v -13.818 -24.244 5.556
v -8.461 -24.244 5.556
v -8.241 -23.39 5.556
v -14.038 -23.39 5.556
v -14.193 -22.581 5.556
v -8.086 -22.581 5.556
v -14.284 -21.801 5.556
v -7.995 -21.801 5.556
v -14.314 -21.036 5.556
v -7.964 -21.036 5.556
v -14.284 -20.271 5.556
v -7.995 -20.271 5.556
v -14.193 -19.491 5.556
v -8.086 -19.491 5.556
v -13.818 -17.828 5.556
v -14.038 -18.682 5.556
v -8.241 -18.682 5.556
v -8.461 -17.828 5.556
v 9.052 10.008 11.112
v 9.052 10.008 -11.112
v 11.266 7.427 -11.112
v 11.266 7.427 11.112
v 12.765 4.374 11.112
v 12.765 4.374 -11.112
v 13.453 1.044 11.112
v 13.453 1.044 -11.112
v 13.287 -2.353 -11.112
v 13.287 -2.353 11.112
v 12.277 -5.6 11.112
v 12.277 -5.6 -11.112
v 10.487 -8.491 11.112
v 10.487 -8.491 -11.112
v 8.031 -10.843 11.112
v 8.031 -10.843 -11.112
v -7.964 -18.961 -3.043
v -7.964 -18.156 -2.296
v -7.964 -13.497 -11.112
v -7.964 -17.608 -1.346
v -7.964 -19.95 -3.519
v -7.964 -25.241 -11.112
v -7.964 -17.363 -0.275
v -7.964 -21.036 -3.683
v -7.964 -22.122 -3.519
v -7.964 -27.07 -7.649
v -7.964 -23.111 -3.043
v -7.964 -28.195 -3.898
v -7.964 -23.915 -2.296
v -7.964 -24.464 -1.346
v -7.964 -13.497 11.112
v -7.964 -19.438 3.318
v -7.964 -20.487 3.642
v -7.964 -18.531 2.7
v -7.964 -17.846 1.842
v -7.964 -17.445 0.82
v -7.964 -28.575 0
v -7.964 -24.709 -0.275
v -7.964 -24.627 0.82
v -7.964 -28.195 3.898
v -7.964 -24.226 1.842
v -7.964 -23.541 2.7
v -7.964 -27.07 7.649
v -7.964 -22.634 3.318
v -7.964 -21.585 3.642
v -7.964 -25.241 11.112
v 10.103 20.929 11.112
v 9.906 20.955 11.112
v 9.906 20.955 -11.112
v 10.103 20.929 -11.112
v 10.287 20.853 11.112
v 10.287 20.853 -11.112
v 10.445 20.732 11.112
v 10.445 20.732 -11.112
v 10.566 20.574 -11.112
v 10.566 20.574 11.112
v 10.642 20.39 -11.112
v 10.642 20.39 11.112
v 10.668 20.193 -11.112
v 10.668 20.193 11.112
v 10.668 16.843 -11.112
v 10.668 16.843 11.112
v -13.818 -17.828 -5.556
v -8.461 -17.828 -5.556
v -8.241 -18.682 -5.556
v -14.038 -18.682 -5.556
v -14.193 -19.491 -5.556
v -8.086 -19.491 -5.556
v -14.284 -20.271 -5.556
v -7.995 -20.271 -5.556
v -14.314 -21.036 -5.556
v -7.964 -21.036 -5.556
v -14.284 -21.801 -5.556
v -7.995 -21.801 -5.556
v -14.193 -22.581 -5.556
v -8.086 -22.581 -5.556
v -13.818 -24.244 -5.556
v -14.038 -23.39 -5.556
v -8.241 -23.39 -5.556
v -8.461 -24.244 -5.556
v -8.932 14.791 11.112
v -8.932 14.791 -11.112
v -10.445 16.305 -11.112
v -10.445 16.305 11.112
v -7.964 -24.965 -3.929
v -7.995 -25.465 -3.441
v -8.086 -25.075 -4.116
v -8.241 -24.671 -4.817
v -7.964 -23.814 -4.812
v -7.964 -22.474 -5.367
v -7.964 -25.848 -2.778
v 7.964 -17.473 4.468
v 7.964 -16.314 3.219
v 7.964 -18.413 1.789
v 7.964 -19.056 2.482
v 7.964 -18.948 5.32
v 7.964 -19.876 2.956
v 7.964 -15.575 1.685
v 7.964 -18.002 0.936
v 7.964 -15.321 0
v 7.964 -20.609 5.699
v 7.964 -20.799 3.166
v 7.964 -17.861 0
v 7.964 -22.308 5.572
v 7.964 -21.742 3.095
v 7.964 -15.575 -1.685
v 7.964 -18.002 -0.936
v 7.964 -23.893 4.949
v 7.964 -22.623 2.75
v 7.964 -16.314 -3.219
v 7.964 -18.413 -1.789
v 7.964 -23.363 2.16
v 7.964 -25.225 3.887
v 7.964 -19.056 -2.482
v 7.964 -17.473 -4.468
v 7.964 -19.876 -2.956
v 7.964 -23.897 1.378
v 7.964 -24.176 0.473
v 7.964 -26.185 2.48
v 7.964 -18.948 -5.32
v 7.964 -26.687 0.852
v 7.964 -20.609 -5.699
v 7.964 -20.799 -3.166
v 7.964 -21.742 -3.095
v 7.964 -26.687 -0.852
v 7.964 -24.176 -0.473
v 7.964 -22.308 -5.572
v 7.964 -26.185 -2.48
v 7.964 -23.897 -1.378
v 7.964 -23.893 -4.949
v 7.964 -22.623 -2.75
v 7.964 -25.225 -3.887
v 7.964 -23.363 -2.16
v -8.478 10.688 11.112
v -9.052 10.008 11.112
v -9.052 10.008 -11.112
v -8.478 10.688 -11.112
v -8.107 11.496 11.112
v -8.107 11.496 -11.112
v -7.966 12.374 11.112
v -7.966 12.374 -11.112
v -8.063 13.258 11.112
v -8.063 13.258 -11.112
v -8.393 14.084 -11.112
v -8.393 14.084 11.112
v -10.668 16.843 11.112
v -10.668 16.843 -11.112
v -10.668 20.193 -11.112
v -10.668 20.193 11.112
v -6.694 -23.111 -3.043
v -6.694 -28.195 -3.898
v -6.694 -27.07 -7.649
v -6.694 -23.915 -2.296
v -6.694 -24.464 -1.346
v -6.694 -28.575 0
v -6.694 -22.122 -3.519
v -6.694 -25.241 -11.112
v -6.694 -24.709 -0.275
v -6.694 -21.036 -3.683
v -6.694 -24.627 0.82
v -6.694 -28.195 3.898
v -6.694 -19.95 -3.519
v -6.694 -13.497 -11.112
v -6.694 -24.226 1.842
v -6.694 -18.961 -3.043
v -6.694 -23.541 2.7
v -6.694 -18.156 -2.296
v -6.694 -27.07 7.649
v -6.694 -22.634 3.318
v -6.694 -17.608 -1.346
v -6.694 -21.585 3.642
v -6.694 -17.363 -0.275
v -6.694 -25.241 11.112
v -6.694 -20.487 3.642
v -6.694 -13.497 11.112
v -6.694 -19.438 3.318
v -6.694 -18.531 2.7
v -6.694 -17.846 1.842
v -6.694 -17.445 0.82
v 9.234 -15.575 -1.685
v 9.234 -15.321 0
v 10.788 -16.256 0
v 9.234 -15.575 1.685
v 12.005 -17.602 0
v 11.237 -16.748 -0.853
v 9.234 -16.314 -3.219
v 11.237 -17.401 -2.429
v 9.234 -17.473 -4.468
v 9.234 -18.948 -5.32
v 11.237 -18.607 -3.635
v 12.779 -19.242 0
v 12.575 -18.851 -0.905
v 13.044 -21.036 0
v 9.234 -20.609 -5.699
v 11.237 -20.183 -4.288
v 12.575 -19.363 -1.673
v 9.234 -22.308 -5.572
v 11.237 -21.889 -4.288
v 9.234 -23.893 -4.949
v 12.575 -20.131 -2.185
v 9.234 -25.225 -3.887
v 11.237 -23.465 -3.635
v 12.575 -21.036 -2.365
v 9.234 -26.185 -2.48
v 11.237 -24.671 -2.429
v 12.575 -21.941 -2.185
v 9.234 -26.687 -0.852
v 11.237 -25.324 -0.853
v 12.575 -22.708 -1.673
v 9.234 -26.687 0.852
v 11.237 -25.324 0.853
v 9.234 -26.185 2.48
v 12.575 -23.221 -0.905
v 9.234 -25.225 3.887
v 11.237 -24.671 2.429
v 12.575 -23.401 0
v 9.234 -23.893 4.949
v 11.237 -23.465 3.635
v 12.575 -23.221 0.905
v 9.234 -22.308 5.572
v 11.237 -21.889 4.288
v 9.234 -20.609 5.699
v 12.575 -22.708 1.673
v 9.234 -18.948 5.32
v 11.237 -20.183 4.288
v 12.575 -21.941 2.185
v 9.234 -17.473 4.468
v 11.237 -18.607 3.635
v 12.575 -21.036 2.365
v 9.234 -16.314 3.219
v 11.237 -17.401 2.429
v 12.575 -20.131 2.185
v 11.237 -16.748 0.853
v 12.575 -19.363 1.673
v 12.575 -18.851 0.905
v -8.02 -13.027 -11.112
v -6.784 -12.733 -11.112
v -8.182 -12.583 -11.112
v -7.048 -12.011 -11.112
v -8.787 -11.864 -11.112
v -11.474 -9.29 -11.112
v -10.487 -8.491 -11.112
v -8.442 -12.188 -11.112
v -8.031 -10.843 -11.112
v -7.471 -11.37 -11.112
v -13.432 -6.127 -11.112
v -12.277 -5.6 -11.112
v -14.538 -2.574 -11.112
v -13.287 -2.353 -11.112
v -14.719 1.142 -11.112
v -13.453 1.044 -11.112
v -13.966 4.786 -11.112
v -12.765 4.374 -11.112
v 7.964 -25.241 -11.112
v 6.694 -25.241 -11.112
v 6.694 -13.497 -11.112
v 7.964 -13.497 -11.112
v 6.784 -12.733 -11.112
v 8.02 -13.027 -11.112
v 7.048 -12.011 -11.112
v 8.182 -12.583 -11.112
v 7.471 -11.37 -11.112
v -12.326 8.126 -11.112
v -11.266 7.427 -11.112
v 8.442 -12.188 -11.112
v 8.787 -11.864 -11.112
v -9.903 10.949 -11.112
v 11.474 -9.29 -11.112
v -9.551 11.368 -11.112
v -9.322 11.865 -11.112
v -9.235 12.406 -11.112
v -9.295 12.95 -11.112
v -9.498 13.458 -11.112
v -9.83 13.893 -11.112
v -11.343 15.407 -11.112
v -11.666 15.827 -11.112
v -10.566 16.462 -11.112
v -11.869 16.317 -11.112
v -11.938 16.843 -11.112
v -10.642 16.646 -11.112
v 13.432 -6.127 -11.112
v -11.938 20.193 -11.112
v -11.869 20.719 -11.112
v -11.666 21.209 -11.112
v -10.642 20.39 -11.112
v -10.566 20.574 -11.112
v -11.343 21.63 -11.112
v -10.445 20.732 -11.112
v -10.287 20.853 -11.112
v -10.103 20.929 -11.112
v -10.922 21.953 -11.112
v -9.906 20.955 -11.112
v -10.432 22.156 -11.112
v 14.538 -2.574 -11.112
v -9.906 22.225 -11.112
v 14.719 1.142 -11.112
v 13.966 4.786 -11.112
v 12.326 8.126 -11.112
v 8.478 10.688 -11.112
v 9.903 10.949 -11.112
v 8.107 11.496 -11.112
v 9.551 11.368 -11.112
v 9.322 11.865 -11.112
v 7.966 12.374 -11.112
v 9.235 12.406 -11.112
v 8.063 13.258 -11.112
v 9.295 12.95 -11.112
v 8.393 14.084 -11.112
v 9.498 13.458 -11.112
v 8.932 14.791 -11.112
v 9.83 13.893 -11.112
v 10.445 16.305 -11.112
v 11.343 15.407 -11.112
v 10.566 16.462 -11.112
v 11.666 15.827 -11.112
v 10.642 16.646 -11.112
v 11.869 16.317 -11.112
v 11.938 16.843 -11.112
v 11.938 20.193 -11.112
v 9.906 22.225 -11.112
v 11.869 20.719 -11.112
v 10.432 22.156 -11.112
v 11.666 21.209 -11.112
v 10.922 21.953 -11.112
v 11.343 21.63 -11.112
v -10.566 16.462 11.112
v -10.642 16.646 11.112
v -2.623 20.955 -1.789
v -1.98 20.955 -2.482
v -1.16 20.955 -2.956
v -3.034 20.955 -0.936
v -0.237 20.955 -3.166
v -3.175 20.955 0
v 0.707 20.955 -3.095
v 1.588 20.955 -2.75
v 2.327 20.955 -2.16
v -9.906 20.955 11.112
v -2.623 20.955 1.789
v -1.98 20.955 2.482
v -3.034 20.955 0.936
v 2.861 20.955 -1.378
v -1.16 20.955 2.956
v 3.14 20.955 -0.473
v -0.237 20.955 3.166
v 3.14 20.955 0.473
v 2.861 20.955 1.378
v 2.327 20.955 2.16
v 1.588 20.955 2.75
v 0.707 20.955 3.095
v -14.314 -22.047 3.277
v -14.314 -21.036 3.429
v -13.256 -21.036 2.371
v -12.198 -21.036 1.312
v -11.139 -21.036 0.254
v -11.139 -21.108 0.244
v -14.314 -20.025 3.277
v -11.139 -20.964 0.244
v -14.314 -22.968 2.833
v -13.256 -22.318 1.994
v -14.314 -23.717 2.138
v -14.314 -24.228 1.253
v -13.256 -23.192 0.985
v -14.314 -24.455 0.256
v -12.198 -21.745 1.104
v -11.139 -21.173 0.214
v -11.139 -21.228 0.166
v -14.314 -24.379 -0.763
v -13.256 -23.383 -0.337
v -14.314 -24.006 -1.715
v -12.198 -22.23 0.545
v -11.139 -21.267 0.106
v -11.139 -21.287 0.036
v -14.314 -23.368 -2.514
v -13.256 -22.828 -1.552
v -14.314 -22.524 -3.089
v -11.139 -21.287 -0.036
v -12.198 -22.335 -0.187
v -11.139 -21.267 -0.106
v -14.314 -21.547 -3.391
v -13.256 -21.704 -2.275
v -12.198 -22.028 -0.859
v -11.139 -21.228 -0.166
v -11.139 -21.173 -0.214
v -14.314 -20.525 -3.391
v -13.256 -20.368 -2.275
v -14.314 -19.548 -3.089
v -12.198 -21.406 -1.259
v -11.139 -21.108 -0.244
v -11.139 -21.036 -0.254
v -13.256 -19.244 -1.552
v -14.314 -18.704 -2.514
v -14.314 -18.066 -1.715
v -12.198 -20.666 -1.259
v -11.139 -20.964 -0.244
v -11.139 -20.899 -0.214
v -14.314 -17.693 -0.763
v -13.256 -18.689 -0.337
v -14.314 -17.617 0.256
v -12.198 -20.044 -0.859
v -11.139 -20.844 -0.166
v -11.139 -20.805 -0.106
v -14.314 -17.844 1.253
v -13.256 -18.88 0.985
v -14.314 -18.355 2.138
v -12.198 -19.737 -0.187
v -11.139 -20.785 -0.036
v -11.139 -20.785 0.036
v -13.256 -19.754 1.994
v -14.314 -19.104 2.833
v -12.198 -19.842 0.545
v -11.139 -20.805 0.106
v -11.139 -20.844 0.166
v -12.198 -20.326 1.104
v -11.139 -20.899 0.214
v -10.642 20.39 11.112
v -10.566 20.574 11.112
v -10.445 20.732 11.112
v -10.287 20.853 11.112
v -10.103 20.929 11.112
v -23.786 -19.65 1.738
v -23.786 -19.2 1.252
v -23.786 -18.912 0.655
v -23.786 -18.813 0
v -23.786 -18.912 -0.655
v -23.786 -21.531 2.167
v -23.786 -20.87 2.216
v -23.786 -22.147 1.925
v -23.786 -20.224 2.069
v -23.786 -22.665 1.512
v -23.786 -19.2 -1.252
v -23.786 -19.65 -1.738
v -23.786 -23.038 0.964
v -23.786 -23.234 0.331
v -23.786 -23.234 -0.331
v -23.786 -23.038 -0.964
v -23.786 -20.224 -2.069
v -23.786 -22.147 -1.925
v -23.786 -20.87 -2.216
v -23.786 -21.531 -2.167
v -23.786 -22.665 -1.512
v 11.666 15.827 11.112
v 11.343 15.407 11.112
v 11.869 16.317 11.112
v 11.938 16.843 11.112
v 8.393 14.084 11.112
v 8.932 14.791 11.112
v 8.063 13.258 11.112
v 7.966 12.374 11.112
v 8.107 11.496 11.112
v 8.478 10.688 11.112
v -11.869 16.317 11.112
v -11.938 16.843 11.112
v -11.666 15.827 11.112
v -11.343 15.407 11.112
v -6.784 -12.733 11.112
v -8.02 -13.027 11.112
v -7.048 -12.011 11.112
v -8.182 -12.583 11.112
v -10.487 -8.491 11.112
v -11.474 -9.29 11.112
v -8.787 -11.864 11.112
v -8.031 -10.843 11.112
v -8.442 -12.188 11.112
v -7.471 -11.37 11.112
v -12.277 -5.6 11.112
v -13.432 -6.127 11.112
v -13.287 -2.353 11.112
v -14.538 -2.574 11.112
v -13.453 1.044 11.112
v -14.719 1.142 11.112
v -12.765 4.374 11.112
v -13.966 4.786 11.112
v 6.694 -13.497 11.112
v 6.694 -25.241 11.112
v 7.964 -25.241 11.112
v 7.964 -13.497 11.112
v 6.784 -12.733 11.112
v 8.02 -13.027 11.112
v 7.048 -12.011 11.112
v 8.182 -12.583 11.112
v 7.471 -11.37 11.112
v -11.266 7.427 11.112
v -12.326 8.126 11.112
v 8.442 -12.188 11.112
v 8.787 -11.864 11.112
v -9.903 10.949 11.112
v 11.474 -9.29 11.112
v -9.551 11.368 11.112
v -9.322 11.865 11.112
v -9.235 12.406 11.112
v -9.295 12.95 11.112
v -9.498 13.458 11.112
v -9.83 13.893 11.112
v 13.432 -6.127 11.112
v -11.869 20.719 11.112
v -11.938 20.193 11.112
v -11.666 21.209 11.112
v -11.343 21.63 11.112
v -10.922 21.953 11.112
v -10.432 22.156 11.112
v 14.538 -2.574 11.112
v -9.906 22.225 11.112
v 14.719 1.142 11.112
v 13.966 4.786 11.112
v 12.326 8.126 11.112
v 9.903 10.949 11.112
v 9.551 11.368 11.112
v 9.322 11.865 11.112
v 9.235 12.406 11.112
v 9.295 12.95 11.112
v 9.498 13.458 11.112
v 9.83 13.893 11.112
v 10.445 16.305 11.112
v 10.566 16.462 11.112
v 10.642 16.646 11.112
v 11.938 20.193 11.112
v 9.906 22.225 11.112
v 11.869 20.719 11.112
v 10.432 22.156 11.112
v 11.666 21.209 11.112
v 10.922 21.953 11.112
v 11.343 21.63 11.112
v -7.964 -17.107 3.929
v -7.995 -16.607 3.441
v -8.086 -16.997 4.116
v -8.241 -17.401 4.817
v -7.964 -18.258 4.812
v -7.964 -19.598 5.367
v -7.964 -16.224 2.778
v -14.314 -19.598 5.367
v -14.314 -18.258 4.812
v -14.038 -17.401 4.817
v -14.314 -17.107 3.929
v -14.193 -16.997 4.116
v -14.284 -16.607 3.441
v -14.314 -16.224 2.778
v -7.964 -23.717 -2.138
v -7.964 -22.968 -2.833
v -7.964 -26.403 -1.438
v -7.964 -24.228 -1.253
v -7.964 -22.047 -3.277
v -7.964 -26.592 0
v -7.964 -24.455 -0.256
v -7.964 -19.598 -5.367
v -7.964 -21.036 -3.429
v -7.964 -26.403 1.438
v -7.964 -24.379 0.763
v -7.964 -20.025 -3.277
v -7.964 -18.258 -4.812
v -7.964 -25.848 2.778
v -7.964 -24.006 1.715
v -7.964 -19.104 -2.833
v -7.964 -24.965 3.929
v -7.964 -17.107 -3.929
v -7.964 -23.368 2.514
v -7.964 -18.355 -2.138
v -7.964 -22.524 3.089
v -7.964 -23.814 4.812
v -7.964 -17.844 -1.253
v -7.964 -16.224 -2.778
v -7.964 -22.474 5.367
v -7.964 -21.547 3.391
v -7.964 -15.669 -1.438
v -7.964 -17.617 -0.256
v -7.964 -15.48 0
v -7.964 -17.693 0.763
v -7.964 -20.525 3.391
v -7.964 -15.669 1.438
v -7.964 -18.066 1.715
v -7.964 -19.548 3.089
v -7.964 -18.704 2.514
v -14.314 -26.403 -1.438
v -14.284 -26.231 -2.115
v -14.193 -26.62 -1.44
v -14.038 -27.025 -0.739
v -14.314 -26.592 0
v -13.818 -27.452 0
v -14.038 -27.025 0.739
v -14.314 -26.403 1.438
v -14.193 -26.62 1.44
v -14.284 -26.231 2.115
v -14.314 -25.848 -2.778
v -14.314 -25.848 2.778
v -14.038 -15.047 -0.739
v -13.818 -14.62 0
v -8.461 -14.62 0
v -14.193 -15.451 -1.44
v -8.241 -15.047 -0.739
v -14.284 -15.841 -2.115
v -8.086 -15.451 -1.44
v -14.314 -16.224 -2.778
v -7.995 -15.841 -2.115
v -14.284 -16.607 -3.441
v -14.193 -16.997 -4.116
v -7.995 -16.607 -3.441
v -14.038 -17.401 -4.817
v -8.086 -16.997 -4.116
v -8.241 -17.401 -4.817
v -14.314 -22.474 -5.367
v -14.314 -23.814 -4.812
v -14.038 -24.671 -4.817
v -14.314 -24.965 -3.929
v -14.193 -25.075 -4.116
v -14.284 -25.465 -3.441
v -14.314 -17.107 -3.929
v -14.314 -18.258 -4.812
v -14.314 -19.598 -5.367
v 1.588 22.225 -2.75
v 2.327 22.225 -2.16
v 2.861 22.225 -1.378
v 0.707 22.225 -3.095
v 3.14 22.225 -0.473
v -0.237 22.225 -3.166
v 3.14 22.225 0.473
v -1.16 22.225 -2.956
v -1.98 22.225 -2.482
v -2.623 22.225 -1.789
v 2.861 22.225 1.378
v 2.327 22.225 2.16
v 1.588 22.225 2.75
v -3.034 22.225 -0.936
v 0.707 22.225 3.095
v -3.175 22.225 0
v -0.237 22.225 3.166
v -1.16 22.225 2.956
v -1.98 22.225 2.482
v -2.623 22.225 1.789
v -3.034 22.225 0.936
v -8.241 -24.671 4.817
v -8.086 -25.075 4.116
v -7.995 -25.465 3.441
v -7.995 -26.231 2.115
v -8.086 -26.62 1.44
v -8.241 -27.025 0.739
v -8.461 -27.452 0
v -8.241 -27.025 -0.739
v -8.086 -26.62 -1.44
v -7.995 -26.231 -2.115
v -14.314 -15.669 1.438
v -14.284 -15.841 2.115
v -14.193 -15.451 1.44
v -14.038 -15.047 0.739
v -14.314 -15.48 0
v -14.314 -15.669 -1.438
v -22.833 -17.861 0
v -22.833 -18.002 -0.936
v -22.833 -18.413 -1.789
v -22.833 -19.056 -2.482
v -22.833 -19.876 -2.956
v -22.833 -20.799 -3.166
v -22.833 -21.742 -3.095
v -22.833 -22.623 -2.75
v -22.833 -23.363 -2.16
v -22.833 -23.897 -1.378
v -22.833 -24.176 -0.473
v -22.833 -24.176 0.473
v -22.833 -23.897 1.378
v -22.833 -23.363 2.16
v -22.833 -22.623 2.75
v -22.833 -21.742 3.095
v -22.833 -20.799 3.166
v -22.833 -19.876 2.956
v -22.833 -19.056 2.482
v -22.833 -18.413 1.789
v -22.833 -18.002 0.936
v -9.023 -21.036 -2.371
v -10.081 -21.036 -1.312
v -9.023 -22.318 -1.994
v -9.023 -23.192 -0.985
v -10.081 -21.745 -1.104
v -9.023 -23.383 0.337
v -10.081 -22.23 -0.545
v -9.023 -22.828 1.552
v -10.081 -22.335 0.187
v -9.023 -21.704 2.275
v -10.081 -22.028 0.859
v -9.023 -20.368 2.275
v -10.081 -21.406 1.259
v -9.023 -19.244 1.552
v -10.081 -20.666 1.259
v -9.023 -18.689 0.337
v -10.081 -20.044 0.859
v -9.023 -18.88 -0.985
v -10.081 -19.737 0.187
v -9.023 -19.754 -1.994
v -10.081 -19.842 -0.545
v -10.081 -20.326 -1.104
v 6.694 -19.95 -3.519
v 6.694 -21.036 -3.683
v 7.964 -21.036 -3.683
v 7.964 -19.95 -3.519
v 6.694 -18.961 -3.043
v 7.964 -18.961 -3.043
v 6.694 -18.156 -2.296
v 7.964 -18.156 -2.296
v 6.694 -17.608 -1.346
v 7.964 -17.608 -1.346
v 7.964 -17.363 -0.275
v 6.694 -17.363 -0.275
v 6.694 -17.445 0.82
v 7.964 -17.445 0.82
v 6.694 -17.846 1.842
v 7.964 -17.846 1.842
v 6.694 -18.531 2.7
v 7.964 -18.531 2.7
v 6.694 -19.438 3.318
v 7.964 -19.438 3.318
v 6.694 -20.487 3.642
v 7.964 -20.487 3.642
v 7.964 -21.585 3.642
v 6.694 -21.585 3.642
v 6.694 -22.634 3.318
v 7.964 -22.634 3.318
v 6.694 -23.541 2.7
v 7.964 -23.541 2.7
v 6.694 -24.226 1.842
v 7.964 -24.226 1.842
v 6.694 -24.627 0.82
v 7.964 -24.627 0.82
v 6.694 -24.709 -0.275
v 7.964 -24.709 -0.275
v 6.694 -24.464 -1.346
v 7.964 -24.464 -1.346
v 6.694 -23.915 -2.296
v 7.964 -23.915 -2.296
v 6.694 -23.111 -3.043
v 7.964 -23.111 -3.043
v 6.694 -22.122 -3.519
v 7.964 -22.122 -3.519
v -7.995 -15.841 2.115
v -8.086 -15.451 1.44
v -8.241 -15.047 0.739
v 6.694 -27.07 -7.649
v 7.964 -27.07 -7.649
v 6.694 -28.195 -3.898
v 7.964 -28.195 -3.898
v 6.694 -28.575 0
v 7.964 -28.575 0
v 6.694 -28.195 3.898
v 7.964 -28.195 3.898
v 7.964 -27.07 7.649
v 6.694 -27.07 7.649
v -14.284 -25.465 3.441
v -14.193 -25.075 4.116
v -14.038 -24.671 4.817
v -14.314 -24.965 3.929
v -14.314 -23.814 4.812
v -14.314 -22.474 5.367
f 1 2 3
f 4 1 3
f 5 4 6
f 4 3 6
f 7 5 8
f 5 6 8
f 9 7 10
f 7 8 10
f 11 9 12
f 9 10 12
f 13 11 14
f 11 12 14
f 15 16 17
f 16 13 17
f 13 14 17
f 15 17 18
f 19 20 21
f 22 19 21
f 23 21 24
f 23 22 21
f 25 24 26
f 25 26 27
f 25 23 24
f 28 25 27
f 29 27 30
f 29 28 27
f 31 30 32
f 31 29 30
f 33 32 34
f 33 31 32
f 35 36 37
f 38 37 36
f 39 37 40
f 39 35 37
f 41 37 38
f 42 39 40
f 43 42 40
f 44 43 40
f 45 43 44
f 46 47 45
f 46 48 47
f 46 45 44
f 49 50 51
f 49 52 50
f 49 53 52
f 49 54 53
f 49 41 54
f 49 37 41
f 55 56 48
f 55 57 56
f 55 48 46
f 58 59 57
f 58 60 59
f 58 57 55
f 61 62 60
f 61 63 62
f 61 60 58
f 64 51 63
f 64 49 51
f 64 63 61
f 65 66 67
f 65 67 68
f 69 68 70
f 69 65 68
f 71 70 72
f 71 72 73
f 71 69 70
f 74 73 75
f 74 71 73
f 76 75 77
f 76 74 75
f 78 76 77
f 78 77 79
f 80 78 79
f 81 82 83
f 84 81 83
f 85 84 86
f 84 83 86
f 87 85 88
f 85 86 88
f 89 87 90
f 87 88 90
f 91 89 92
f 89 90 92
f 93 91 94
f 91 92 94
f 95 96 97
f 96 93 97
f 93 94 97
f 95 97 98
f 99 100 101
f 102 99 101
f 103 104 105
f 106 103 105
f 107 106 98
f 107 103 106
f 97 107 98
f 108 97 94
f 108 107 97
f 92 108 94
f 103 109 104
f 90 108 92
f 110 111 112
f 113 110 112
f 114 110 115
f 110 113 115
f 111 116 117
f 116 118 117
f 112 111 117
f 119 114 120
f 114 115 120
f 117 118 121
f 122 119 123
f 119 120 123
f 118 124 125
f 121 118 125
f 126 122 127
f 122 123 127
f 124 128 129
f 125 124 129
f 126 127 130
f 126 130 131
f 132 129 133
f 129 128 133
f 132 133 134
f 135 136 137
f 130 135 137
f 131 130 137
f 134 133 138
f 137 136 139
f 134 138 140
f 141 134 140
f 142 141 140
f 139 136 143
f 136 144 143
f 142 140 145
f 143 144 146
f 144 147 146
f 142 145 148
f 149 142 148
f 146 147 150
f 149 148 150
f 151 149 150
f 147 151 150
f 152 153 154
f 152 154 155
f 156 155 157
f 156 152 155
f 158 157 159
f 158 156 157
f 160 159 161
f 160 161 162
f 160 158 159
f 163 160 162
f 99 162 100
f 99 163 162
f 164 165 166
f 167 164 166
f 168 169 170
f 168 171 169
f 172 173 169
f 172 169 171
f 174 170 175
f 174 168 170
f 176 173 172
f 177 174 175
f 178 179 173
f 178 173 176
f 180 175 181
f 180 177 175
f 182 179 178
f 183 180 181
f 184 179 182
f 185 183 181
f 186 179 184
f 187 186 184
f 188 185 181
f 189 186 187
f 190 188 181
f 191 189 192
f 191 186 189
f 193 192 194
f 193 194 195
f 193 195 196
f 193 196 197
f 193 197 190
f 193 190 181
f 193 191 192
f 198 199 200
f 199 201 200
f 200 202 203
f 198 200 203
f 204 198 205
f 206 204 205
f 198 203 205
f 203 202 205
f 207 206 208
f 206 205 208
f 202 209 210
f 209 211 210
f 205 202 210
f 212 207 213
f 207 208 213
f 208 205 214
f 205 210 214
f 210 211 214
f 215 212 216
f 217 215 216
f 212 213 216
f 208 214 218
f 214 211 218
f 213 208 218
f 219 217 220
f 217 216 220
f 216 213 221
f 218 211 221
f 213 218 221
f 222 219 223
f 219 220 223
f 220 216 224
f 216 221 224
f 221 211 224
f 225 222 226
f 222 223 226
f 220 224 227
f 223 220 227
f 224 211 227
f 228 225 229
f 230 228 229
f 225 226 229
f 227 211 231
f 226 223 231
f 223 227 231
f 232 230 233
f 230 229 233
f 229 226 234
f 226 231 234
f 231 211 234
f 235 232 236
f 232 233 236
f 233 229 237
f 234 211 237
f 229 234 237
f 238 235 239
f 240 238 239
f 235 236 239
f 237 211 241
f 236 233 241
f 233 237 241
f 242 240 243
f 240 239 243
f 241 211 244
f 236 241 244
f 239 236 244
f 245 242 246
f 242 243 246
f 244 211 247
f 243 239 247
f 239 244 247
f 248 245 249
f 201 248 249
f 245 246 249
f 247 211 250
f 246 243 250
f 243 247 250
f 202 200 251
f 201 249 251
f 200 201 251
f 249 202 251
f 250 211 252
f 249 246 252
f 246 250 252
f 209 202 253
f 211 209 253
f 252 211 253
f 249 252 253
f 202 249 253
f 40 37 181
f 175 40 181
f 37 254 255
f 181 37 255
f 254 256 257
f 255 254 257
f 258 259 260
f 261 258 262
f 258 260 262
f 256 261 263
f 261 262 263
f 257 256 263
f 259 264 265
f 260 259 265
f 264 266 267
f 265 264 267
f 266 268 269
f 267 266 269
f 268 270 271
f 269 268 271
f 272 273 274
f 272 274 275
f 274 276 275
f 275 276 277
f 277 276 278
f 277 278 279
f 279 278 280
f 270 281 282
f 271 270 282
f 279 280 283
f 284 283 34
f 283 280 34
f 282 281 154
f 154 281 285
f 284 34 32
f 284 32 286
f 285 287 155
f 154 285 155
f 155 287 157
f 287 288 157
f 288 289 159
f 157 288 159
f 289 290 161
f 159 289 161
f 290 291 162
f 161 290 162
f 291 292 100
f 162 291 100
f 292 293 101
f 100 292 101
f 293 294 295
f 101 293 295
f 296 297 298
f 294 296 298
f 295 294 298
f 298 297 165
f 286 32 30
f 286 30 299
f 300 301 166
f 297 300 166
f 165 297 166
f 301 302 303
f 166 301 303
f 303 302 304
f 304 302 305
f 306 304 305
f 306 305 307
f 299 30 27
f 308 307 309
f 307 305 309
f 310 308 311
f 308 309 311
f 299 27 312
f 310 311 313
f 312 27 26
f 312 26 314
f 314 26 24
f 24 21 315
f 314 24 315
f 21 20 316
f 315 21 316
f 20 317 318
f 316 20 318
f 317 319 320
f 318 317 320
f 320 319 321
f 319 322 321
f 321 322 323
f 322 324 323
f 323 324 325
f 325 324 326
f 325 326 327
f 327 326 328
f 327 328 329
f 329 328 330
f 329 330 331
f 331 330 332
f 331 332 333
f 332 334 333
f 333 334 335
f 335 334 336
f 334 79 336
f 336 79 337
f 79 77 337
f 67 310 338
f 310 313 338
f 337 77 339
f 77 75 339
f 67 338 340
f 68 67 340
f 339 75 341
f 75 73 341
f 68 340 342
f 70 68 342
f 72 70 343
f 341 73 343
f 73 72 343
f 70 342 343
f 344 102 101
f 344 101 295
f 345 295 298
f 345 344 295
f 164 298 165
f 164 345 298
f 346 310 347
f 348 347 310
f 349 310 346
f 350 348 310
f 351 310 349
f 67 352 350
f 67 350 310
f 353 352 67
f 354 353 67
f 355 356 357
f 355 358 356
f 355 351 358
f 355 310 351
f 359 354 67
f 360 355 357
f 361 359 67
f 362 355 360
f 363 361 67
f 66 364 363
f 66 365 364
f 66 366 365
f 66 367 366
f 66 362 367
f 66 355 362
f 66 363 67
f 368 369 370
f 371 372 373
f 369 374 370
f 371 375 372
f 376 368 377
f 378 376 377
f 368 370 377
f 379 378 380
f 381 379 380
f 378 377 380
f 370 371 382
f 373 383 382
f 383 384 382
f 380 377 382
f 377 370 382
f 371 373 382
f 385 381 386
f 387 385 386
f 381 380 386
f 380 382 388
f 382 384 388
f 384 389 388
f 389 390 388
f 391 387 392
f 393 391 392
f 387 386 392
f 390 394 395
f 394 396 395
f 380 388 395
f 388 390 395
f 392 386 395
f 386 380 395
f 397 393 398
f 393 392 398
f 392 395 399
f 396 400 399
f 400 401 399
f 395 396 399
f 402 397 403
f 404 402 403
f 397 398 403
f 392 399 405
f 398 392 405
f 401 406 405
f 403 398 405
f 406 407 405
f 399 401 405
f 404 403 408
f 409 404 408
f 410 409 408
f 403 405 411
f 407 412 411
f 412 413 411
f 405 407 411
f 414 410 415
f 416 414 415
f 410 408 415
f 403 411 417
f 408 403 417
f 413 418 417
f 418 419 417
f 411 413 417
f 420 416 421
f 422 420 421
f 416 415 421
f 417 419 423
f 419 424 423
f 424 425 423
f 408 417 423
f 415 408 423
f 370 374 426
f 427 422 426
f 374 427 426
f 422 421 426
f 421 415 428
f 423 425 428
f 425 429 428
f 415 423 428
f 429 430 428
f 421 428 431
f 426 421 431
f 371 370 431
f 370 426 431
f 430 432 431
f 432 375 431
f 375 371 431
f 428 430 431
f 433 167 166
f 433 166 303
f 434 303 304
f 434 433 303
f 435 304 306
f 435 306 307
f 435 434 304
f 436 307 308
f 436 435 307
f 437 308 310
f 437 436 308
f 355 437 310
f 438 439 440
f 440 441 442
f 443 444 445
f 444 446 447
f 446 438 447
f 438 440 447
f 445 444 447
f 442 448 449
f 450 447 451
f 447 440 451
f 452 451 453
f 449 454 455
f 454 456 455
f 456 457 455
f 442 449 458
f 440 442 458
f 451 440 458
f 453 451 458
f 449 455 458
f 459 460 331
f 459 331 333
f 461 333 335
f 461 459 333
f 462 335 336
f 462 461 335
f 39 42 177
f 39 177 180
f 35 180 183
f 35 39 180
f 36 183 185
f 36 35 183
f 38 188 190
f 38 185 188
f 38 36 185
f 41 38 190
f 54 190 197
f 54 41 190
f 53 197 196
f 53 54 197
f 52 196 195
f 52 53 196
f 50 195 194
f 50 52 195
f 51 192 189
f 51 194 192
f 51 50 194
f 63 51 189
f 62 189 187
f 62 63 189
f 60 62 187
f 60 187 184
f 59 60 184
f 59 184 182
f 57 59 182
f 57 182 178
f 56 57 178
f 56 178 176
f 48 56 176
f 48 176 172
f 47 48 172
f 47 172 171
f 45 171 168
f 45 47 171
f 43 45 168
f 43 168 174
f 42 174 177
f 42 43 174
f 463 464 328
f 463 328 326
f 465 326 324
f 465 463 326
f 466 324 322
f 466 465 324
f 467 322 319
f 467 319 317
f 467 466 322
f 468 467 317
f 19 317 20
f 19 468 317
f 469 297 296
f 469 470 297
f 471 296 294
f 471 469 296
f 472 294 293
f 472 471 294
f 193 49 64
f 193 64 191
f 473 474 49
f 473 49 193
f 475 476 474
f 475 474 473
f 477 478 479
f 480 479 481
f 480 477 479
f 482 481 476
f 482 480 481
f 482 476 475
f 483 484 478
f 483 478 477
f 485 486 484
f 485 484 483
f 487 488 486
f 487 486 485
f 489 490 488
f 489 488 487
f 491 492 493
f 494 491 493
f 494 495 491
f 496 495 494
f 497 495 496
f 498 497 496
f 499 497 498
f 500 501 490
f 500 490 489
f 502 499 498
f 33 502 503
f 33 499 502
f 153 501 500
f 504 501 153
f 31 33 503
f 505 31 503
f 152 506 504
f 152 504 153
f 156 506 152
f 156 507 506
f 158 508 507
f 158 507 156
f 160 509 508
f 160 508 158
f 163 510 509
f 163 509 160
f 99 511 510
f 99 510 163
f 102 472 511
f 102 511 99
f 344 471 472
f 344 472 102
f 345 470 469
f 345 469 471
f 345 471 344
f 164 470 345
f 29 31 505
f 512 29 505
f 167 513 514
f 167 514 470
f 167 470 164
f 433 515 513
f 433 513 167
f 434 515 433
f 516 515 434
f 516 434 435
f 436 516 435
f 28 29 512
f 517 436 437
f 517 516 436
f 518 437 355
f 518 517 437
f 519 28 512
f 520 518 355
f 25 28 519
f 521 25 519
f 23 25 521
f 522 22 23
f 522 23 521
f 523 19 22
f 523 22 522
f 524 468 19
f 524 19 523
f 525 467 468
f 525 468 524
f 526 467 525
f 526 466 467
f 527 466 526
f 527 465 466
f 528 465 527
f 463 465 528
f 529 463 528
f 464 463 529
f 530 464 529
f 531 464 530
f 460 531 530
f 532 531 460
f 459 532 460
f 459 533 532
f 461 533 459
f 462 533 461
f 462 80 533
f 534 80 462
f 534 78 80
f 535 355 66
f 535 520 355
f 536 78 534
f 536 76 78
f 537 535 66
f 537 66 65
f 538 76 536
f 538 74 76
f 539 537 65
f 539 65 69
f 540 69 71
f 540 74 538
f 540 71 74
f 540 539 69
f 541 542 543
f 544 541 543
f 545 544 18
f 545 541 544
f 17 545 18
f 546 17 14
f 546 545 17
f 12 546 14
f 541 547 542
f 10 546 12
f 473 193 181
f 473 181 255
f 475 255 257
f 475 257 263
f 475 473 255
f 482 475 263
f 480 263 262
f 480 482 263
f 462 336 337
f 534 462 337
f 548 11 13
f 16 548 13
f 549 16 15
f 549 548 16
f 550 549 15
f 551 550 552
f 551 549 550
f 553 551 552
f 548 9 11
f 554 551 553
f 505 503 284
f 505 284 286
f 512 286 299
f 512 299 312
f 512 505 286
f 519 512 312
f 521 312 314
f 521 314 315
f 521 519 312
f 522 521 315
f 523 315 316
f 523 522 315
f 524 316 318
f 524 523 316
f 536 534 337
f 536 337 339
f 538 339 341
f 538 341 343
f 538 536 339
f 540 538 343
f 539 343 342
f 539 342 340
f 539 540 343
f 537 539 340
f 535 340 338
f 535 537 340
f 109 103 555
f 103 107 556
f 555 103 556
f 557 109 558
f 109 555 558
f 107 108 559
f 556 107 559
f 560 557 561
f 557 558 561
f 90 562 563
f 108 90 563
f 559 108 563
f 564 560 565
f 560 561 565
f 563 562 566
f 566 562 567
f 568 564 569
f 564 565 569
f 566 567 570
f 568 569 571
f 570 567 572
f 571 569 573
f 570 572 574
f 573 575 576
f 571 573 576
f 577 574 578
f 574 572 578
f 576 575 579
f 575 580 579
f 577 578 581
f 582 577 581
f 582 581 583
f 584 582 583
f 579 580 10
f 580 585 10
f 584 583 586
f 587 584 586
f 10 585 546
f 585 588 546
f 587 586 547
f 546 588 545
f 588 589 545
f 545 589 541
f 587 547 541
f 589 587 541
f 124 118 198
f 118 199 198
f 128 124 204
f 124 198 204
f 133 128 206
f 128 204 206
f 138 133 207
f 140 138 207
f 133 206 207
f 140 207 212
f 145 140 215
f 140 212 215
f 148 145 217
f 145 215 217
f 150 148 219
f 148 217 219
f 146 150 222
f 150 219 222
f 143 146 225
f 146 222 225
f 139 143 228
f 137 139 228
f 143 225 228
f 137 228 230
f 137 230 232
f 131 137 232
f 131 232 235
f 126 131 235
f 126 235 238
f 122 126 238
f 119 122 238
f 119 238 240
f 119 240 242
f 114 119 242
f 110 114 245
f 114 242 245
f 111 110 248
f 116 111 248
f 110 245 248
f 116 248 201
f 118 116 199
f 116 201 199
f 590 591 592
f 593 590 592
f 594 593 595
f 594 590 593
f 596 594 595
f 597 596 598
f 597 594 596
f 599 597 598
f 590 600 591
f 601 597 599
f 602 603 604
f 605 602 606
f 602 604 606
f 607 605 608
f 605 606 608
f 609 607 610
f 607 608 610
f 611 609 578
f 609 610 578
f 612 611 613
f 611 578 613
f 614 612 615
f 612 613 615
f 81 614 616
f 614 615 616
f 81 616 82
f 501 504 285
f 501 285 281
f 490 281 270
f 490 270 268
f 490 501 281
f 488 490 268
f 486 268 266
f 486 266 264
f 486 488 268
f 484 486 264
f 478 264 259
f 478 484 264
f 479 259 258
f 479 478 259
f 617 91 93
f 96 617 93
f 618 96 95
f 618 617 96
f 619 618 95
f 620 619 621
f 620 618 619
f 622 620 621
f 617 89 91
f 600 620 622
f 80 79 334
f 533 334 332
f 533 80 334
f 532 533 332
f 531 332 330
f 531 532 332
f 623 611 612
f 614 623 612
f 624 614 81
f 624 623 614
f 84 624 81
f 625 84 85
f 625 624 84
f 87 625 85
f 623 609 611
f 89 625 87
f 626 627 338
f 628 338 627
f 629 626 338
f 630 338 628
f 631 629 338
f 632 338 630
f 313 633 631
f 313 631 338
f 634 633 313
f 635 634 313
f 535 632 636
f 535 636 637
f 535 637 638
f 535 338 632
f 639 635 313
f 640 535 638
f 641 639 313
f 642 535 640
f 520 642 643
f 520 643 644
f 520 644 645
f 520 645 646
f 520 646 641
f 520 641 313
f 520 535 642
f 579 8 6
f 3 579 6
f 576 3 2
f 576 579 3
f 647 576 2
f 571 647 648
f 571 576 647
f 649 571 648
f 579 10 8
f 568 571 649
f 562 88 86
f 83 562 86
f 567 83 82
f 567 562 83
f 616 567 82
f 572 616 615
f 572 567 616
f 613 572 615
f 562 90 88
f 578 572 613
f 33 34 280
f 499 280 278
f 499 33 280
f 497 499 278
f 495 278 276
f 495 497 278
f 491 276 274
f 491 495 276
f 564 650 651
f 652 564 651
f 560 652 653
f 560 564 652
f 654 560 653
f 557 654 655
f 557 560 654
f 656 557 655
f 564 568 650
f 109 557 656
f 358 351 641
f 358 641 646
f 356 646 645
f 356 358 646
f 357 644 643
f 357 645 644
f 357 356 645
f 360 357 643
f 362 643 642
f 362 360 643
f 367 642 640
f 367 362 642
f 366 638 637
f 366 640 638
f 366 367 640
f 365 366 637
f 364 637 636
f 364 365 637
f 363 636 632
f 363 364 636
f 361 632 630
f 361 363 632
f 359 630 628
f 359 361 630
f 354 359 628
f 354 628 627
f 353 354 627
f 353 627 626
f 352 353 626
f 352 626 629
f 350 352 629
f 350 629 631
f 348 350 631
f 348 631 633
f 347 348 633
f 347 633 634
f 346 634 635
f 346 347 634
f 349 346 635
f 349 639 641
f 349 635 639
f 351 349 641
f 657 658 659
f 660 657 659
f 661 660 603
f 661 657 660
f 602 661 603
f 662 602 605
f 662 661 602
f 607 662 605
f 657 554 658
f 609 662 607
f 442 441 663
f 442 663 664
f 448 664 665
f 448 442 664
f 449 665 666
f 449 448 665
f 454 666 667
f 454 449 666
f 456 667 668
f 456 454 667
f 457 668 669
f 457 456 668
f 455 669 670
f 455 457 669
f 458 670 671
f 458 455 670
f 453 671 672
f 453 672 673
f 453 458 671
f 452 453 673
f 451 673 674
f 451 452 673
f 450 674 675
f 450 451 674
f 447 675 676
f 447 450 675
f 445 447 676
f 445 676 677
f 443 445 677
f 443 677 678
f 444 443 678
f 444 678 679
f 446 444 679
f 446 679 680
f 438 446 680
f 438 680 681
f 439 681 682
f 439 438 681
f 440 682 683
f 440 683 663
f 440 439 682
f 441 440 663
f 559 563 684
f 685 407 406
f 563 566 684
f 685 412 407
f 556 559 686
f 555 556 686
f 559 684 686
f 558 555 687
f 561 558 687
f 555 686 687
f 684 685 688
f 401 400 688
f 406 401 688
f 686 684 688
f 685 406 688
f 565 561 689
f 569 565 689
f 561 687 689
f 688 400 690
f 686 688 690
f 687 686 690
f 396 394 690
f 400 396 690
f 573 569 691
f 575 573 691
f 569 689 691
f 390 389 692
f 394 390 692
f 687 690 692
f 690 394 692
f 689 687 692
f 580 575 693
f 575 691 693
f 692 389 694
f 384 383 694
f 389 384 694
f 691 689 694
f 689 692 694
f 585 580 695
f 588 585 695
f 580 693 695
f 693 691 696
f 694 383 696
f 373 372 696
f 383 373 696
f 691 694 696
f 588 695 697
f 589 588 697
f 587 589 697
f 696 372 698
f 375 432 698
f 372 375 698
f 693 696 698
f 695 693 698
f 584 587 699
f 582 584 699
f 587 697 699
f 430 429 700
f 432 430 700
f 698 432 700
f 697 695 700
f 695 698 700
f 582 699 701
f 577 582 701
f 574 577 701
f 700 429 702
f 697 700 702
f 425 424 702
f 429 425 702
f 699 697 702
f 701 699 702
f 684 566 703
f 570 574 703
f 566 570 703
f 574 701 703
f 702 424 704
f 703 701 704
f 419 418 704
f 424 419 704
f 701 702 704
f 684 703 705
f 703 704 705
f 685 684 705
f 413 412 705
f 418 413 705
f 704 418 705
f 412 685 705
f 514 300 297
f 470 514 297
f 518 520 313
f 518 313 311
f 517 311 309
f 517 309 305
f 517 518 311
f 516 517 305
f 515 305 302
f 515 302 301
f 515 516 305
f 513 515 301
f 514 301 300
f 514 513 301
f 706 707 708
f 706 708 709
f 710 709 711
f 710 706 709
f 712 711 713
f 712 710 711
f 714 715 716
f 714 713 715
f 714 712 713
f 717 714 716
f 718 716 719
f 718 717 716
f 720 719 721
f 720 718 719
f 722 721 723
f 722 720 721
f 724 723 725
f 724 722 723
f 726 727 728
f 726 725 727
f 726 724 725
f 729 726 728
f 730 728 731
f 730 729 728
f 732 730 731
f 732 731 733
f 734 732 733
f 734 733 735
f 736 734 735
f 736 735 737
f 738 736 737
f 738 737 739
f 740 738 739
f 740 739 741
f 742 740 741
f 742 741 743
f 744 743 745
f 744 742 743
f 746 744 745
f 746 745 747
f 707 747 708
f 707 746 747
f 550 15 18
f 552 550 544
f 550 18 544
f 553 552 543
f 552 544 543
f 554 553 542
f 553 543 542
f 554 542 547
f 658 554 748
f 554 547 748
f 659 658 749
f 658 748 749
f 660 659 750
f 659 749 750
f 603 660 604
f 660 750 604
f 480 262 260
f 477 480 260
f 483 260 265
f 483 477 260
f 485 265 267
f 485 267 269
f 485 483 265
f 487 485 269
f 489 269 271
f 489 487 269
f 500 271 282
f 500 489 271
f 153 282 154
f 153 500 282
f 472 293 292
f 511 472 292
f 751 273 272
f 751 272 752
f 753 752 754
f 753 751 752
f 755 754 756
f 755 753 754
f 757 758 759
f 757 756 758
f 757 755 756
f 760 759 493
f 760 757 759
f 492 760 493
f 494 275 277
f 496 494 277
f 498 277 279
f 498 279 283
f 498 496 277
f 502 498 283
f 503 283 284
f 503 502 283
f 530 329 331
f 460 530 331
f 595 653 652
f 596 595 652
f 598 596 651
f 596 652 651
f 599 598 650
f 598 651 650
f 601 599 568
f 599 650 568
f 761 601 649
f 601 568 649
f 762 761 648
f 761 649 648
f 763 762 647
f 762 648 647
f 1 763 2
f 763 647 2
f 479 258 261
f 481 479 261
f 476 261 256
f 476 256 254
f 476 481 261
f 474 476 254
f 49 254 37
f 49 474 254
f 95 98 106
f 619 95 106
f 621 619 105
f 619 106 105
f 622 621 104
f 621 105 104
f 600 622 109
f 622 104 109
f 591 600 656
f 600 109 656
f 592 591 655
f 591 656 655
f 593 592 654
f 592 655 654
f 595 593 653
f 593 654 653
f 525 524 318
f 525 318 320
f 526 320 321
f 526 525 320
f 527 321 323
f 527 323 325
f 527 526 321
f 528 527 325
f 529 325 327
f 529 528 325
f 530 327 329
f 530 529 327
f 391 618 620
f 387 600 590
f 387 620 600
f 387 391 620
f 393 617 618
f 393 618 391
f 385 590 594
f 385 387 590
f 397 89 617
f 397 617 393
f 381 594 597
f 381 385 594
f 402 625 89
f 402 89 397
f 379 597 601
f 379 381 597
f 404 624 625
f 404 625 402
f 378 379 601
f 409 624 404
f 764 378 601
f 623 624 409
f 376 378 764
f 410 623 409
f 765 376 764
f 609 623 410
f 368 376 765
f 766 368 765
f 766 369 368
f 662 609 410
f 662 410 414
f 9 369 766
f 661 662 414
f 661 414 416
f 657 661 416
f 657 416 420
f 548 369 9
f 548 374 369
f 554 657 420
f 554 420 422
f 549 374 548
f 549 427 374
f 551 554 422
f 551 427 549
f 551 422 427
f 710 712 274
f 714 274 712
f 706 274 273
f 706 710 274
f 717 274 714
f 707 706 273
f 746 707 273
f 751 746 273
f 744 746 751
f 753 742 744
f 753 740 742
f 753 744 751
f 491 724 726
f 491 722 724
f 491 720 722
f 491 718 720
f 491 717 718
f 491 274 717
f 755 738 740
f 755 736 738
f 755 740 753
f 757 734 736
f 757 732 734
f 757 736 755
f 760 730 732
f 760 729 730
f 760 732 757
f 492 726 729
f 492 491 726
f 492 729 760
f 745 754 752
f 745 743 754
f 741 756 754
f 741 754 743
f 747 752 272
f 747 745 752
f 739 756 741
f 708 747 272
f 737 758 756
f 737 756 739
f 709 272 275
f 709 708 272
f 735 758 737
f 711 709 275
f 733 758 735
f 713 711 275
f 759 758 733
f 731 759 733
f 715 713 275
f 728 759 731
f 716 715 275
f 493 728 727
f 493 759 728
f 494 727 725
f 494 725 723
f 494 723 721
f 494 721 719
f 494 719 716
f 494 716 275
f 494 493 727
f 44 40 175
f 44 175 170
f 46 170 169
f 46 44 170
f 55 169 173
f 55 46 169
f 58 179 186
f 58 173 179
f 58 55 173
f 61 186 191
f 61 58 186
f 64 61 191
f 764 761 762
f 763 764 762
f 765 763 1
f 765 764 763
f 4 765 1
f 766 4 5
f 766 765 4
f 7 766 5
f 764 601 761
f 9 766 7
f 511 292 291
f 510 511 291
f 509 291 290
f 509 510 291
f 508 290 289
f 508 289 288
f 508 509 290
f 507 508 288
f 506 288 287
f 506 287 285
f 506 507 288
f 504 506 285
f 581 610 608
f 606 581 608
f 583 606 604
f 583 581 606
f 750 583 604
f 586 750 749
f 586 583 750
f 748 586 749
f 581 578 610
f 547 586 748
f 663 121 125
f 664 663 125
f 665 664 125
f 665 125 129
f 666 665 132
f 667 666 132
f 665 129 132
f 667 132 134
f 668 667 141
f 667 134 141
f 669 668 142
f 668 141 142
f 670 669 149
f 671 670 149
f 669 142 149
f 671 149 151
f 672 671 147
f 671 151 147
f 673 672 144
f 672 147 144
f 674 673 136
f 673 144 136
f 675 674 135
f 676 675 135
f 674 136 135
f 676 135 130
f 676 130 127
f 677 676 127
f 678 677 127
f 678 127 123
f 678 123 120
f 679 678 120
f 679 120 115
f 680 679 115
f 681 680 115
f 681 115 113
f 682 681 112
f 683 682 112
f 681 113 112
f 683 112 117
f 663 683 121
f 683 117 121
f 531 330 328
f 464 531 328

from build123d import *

# Parameters (mm, degrees)
BOSS_EXTRUDE1_DEPTH     = 11.1125
SKETCH2_R               = 3.175
CUT_EXTRUDE2_DEPTH      = 35.029202096
CUT_EXTRUDE5_DEPTH      = 39.804249354
CUT_EXTRUDE5_DEPTH_BACK = 39.804249354
SKETCH8_R               = 3.683
CHAMFER1_SIZE           = 0.9525
BOSS_EXTRUDE2_DEPTH     = 6.35
SKETCH10_OUTSIDE_W      = 187.574
SKETCH10_OUTSIDE_H      = 216.15
SKETCH10_OUTSIDE_R      = 5.55625
CUT_EXTRUDE6_DEPTH      = 43.255900172
CUT_EXTRUDE6_DRAFT      = -60
SKETCH11_OUTSIDE_W      = 173.406
SKETCH11_OUTSIDE_H      = 201.98
SKETCH11_OUTSIDE_R      = 5.55625
CUT_EXTRUDE7_DEPTH      = 39.165301237
CUT_EXTRUDE7_DRAFT      = -60
CUT_EXTRUDE3_DEPTH      = 39.804249354
CUT_EXTRUDE3_DEPTH_BACK = 39.804249354


with BuildPart() as part:
    # Sketch1 → Boss-Extrude1 (new, symmetric)
    with BuildSketch(Plane.XY):
        with BuildLine():
            Line((-11.342840979, 15.406534021), (-9.829627985, 13.893321026))
            ThreePointArc((-9.829627985, 13.893321026), (-9.235107004, 12.40556259), (-9.903417898, 10.949457886))
            ThreePointArc((-9.903417898, 10.949457886), (-14.746105665, -0.721582839), (-8.787066292, -11.864054115))
            ThreePointArc((-8.787066292, -11.864054115), (-8.181733414, -12.582757694), (-7.964468964, -13.496956187))
            Line((-7.964468964, -13.496956187), (-7.964468964, -28.575))
            Line((-7.964468964, -28.575), (-6.694468964, -28.575))
            Line((-6.694468964, -28.575), (-6.694468964, -13.496956187))
            ThreePointArc((-6.694468964, -13.496956187), (-7.047523696, -12.011383636), (-8.031189621, -10.84349032))
            ThreePointArc((-8.031189621, -10.84349032), (-13.477623457, -0.659511197), (-9.051510982, 10.007569035))
            ThreePointArc((-9.051510982, 10.007569035), (-7.965505779, 12.373739179), (-8.931602372, 14.791346638))
            Line((-8.931602372, 14.791346638), (-10.444815367, 16.304559633))
            ThreePointArc((-10.444815367, 16.304559633), (-10.609996204, 16.551770225), (-10.668, 16.843375))
            Line((-10.668, 16.843375), (-10.668, 20.193))
            ThreePointArc((-10.668, 20.193), (-10.444815367, 20.731815367), (-9.906, 20.955))
            Line((-9.906, 20.955), (9.906, 20.955))
            ThreePointArc((9.906, 20.955), (10.444815367, 20.731815367), (10.668, 20.193))
            Line((10.668, 20.193), (10.668, 16.843375))
            ThreePointArc((10.668, 16.843375), (10.609996204, 16.551770225), (10.444815367, 16.304559633))
            Line((10.444815367, 16.304559633), (8.931602372, 14.791346638))
            ThreePointArc((8.931602372, 14.791346638), (7.965505779, 12.373739179), (9.051510982, 10.007569035))
            ThreePointArc((9.051510982, 10.007569035), (13.477623457, -0.659511197), (8.031189621, -10.84349032))
            ThreePointArc((8.031189621, -10.84349032), (7.047523696, -12.011383636), (6.694468964, -13.496956187))
            Line((6.694468964, -13.496956187), (6.694468964, -28.575))
            Line((6.694468964, -28.575), (7.964468964, -28.575))
            Line((7.964468964, -28.575), (7.964468964, -13.496956187))
            ThreePointArc((7.964468964, -13.496956187), (8.181733414, -12.582757694), (8.787066292, -11.864054115))
            ThreePointArc((8.787066292, -11.864054115), (14.746105665, -0.721582839), (9.903417898, 10.949457886))
            ThreePointArc((9.903417898, 10.949457886), (9.235107004, 12.40556259), (9.829627985, 13.893321026))
            Line((9.829627985, 13.893321026), (11.342840979, 15.406534021))
            ThreePointArc((11.342840979, 15.406534021), (11.78332321, 16.065762265), (11.938, 16.843375))
            Line((11.938, 16.843375), (11.938, 20.193))
            ThreePointArc((11.938, 20.193), (11.342840979, 21.629840979), (9.906, 22.225))
            Line((9.906, 22.225), (-9.906, 22.225))
            ThreePointArc((-9.906, 22.225), (-11.342840979, 21.629840979), (-11.938, 20.193))
            Line((-11.938, 20.193), (-11.938, 16.843375))
            ThreePointArc((-11.938, 16.843375), (-11.78332321, 16.065762265), (-11.342840979, 15.406534021))
        make_face()
    extrude(amount=BOSS_EXTRUDE1_DEPTH, both=True)

    # Sketch2 → Cut-Extrude2 (cut, through all)
    with BuildSketch(Plane(origin=(0, 0, 0), x_dir=(1, 0, 0), z_dir=(0, 1, 0))):
        Circle(SKETCH2_R)
    extrude(amount=CUT_EXTRUDE2_DEPTH, mode=Mode.SUBTRACT)

    # Sketch8 → Cut-Extrude5 (cut, two sides: drawn at the far end of the back side and taken through both)
    with BuildSketch(Plane(origin=(0, 0, 0), x_dir=(0, 0, -1), z_dir=(1, 0, 0)).offset(-CUT_EXTRUDE5_DEPTH_BACK)):
        with Locations((0, -21.035978094)):
            Circle(SKETCH8_R)
    extrude(amount=CUT_EXTRUDE5_DEPTH + CUT_EXTRUDE5_DEPTH_BACK, mode=Mode.SUBTRACT)

    # Sketch3 → Cut-Extrude3 (cut, two sides: drawn at the far end of the back side and taken through both)
    with BuildSketch(Plane(origin=(0, 0, 0), x_dir=(0, 0, -1), z_dir=(1, 0, 0)).offset(-CUT_EXTRUDE3_DEPTH_BACK)):
        with BuildLine():
            Line((11.1125, -31.90875), (11.1125, -25.24125))
            ThreePointArc((11.1125, -25.24125), (0, -28.575), (-11.1125, -25.24125))
            Line((-11.1125, -25.24125), (-11.1125, -31.90875))
            Line((-11.1125, -31.90875), (11.1125, -31.90875))
        make_face()
    extrude(amount=CUT_EXTRUDE3_DEPTH + CUT_EXTRUDE3_DEPTH_BACK, mode=Mode.SUBTRACT)


with BuildPart() as body_2:
    # Sketch4 → Revolve1 (revolve)
    with BuildSketch(Plane.XY):
        with BuildLine():
            Line((-23.785531036, -17.860978094), (7.964468964, -17.860978094))
            Line((7.964468964, -17.860978094), (7.964468964, -15.320978094))
            Line((7.964468964, -15.320978094), (9.234468964, -15.320978094))
            ThreePointArc((9.234468964, -15.320978094), (12.004650349, -17.601690504), (13.044468964, -21.035978094))
            Line((13.044468964, -21.035978094), (-23.785531036, -21.035978094))
            Line((-23.785531036, -21.035978094), (-23.785531036, -17.860978094))
        make_face()
    revolve(axis=Axis((13.044468964, -21.035978094, 0), (-1, 0, 0)))

    # Chamfer1
    chamfer1_edges = [body_2.edges().sort_by_distance(p)[0] for p in [
        (-23.785531036, -24.210978094, 0),
    ]]
    chamfer(chamfer1_edges, length=CHAMFER1_SIZE)


with BuildPart() as body_3:
    # Sketch9 → Boss-Extrude2 (new body)
    with BuildSketch(Plane.ZY.offset(7.964468964)):
        Polygon((0, -27.45178296), (5.55625, -24.243880527), (5.55625, -17.82807566), (0, -14.620173227), (-5.55625, -17.82807566), (-5.55625, -24.243880527), align=None)
    extrude(amount=BOSS_EXTRUDE2_DEPTH)


with BuildPart() as cut_extrude6_tool:
    # Sketch10 outside → Cut-Extrude6 (with draft: the straight prism first)
    with BuildSketch(Plane.ZY.offset(14.314468964)):
        with Locations((0, -3.175)):
            Rectangle(SKETCH10_OUTSIDE_W, SKETCH10_OUTSIDE_H)
        with Locations((0, -21.035978094)):
            Circle(SKETCH10_OUTSIDE_R, mode=Mode.SUBTRACT)
    extrude(amount=-CUT_EXTRUDE6_DEPTH)
    # Cut-Extrude6: the draft: its side faces are tilted about the plane it starts from
    cut_extrude6_sides = [cut_extrude6_tool.faces().sort_by_distance(p)[0] for p in [
        (7.313481122, -111.25, 0),
        (7.313481122, -3.175, 93.787),
        (7.313481122, 104.9, 0),
        (7.313481122, -3.175, -93.787),
        (7.313481122, -21.035978094, -5.55625),
    ]]
    draft(cut_extrude6_sides, Plane.ZY.offset(14.314468964), CUT_EXTRUDE6_DRAFT)


with BuildPart() as body_3_1:
    add(body_3.part)

    # Cut-Extrude6: cut by cut_extrude6_tool
    add(cut_extrude6_tool.part, mode=Mode.SUBTRACT)


with BuildPart() as cut_extrude7_tool:
    # Sketch11 outside → Cut-Extrude7 (with draft: the straight prism first)
    with BuildSketch(Plane(origin=(-7.964468964, 0, 0), x_dir=(0, 0, -1), z_dir=(1, 0, 0))):
        with Locations((0, -3.175)):
            Rectangle(SKETCH11_OUTSIDE_W, SKETCH11_OUTSIDE_H)
        with Locations((0, -21.035978094)):
            Circle(SKETCH11_OUTSIDE_R, mode=Mode.SUBTRACT)
    extrude(amount=-CUT_EXTRUDE7_DEPTH)
    # Cut-Extrude7: the draft: its side faces are tilted about the plane it starts from
    cut_extrude7_sides = [cut_extrude7_tool.faces().sort_by_distance(p)[0] for p in [
        (-27.547119582, -104.165, 0),
        (-27.547119582, -3.175, -86.703),
        (-27.547119582, 97.815, 0),
        (-27.547119582, -3.175, 86.703),
        (-27.547119582, -21.035978094, 5.55625),
    ]]
    draft(cut_extrude7_sides, Plane(origin=(-7.964468964, 0, 0), x_dir=(0, 0, -1), z_dir=(1, 0, 0)), CUT_EXTRUDE7_DRAFT)


with BuildPart() as body_3_2:
    add(body_3_1.part)

    # Cut-Extrude7: cut by cut_extrude7_tool
    add(cut_extrude7_tool.part, mode=Mode.SUBTRACT)

    # Cut-Extrude8 cone 1 section (through the dimple's axis) → Cut-Extrude8 (revolve, cut)
    with BuildSketch(Plane(origin=(-14.314468964, -21.035978094, 0), x_dir=(0, 0, 1), z_dir=(0, 1, 0))):
        Polygon((0, 0), (3.429, 0), (0, 3.429), align=None)
    revolve(axis=Axis((-14.314468964, -21.035978094, 0), (1, 0, 0)), mode=Mode.SUBTRACT)

    # Cut-Extrude9 cone 1 section (through the dimple's axis) → Cut-Extrude9 (revolve, cut)
    with BuildSketch(Plane(origin=(-7.964468964, -21.035978094, 0), x_dir=(0, 0, -1), z_dir=(0, 1, 0))):
        Polygon((0, 0), (3.429, 0), (0, 3.429), align=None)
    revolve(axis=Axis((-7.964468964, -21.035978094, 0), (-1, 0, 0)), mode=Mode.SUBTRACT)


solid = Compound([part.part, body_2.part, body_3_2.part])
